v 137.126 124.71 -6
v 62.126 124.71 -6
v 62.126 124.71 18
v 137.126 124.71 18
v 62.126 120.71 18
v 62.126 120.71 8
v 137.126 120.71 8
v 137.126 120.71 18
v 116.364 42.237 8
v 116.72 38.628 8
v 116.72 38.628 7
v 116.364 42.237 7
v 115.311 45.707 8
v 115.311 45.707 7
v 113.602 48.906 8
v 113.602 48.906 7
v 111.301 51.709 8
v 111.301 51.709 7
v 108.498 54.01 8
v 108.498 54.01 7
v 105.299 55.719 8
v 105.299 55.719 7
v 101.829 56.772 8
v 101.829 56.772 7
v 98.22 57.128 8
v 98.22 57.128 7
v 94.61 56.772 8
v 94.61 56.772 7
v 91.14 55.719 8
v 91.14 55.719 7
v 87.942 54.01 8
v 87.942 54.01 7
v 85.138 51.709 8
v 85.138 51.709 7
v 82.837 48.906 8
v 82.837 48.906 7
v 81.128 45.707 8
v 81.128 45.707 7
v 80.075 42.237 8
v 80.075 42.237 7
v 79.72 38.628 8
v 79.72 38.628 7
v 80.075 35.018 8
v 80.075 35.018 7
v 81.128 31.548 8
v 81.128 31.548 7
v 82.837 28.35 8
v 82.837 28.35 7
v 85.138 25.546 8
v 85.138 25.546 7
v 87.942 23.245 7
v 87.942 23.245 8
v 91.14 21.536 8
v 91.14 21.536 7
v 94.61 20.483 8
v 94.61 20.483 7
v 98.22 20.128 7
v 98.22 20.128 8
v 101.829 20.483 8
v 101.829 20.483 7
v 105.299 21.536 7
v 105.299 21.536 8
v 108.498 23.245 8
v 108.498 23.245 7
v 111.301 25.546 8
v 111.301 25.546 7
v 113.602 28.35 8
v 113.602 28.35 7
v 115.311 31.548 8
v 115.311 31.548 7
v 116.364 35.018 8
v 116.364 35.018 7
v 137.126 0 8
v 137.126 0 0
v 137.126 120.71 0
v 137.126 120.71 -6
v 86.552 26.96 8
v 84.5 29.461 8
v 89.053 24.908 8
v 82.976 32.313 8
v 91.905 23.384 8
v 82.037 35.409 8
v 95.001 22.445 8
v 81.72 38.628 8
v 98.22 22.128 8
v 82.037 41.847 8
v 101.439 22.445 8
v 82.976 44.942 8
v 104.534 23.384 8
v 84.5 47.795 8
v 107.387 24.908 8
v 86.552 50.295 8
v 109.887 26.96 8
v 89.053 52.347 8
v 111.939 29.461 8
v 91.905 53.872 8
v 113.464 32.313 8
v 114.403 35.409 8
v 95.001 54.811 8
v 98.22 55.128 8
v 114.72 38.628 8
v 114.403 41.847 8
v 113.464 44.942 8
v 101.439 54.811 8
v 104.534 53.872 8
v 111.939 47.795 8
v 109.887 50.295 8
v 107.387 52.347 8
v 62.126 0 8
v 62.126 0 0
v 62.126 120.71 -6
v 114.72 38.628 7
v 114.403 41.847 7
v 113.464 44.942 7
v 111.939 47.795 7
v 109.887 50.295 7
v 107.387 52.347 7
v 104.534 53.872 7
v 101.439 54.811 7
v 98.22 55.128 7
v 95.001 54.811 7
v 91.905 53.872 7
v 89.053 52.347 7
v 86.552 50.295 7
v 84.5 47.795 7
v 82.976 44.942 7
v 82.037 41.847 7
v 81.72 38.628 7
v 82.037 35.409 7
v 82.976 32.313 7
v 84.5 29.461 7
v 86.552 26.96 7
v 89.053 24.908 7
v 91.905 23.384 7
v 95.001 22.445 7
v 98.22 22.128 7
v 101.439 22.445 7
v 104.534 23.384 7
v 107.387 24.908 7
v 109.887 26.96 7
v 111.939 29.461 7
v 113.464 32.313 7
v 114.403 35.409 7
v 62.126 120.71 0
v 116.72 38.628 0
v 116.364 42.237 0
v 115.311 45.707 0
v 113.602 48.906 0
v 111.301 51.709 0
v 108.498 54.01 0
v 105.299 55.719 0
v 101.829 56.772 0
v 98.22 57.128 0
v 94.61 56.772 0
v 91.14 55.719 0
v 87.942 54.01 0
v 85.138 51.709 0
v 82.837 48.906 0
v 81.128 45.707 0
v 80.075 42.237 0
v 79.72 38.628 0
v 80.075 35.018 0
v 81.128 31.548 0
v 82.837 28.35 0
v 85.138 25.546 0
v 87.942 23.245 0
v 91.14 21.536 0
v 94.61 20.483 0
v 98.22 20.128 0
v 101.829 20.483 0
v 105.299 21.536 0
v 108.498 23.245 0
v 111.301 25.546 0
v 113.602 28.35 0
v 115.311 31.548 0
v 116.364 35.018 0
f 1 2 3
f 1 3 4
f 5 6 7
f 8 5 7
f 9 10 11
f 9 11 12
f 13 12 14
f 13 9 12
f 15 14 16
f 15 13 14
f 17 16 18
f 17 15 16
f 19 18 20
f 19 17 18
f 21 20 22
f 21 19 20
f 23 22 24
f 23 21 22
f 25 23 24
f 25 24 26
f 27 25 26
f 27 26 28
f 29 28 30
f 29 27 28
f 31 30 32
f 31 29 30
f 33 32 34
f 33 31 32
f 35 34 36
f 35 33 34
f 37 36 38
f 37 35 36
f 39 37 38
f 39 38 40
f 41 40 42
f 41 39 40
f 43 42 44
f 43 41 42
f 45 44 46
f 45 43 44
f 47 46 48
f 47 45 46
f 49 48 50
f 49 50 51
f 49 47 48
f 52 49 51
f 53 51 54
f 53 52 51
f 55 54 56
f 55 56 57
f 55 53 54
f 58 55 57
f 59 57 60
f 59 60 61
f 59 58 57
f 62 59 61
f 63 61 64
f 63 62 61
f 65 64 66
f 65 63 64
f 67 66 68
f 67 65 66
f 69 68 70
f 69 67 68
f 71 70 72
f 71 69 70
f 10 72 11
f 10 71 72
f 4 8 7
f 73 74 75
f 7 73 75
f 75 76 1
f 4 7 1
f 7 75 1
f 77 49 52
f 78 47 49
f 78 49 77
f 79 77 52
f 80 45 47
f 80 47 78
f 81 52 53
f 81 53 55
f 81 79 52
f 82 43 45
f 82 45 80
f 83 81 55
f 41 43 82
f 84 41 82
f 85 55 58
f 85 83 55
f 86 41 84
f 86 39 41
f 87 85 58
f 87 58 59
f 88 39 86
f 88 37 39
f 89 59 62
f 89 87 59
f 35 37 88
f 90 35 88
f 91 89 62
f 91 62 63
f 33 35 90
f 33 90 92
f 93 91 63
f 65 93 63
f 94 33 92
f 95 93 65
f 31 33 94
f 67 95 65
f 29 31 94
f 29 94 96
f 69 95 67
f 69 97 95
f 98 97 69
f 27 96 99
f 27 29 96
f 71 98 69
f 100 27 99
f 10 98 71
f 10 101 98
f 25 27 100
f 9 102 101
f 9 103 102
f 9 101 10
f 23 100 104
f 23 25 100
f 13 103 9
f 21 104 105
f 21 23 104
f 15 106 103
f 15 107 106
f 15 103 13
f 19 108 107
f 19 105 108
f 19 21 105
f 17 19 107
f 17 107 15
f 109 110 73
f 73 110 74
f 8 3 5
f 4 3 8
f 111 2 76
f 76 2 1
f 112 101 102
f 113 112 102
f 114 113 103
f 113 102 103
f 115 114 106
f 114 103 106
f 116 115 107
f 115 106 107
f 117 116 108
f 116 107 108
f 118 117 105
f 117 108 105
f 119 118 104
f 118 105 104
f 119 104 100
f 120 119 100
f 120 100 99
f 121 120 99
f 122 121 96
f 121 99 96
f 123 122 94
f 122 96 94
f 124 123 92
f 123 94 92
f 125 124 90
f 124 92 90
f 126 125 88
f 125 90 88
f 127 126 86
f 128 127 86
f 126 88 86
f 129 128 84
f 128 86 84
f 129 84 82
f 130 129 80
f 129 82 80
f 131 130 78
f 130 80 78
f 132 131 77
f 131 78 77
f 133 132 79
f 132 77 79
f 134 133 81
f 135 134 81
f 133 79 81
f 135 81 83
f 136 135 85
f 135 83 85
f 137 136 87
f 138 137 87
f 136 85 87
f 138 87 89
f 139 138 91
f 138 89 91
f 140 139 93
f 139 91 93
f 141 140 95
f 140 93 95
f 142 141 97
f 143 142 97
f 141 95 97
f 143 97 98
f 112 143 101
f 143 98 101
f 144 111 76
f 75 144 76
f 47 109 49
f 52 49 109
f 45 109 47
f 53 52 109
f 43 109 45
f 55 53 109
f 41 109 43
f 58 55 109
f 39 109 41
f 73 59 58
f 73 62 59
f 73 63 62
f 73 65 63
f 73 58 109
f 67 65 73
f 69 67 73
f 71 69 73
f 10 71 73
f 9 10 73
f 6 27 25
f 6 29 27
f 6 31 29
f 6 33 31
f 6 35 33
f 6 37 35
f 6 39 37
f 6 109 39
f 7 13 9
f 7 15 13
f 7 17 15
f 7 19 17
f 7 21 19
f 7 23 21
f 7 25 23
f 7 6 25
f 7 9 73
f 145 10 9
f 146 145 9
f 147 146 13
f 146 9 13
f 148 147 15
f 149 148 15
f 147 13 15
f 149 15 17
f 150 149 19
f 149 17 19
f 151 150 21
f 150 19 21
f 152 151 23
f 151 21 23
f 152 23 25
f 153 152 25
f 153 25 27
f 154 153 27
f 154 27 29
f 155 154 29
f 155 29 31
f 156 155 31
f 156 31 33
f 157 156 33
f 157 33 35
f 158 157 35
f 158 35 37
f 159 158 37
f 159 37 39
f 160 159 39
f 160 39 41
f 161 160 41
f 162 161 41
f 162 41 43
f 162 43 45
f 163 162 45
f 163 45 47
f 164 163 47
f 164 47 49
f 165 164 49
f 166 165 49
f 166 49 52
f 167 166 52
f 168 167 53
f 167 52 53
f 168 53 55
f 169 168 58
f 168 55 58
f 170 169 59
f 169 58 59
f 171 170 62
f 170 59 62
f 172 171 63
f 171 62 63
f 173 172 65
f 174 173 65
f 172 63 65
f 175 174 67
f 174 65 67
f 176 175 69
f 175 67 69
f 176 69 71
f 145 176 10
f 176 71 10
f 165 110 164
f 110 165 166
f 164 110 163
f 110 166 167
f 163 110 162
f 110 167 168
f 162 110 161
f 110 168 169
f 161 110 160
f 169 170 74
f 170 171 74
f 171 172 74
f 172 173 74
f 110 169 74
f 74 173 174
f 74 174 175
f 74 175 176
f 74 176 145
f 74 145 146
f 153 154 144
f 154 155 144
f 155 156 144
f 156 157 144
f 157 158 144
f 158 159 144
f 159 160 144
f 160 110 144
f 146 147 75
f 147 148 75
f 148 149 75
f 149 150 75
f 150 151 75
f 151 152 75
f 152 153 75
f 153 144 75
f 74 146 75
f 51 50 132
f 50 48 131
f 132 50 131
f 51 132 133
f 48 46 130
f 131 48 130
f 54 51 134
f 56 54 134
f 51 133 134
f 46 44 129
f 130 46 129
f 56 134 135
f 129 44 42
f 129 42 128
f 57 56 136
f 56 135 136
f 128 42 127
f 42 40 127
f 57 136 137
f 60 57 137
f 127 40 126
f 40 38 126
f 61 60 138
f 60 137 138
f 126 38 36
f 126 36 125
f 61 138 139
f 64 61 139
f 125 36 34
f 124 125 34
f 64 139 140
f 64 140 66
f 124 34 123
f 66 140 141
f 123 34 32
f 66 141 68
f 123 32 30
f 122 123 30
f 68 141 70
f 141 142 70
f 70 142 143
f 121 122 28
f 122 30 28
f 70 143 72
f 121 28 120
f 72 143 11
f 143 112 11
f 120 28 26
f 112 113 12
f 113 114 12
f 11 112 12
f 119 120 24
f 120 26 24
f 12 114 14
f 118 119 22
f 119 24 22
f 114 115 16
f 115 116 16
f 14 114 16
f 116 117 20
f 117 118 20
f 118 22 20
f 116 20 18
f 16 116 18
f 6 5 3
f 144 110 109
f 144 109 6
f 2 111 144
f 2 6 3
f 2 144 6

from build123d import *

# Parameters (mm, degrees)
SKETCH12_W                = 75
SKETCH12_H                = 124.71
BOSS_EXTRUDE10_DEPTH      = 8
BOSS_EXTRUDE13_DEPTH      = 10
BOSS_EXTRUDE13_DEPTH_BACK = 14
SKETCH24_W                = 75
SKETCH24_H                = 4
SKETCH25_R                = 18.5
CUT_EXTRUDE1_DEPTH        = 186.881905155
SKETCH26_R                = 18.5
SKETCH26_R_2              = 16.5
BOSS_EXTRUDE15_DEPTH      = 1


with BuildPart() as part:
    # Sketch12 → Boss-Extrude10 (new body)
    with BuildSketch(Plane.XY):
        with Locations((99.625849364, 62.355)):
            Rectangle(SKETCH12_W, SKETCH12_H)
    extrude(amount=BOSS_EXTRUDE10_DEPTH)

    # Sketch24 → Boss-Extrude13 (add, two sides: drawn at the far end of the back side and taken through both)
    with BuildSketch(Plane.XY.offset(8).offset(-BOSS_EXTRUDE13_DEPTH_BACK)):
        with Locations((99.625849364, 122.71)):
            Rectangle(SKETCH24_W, SKETCH24_H)
    extrude(amount=BOSS_EXTRUDE13_DEPTH + BOSS_EXTRUDE13_DEPTH_BACK)

    # Sketch25 → Cut-Extrude1 (cut, through all)
    with BuildSketch(Plane.XY.offset(8)):
        with Locations((98.219620603, 38.627603634)):
            Circle(SKETCH25_R)
    extrude(amount=-CUT_EXTRUDE1_DEPTH, mode=Mode.SUBTRACT)


with BuildPart() as body_2:
    # Sketch26 → Boss-Extrude15 (new body)
    with BuildSketch(Plane.XY.offset(8)):
        with Locations((98.219620603, 38.627603634)):
            Circle(SKETCH26_R)
        with Locations((98.219620603, 38.627603634)):
            Circle(SKETCH26_R_2, mode=Mode.SUBTRACT)
    extrude(amount=-BOSS_EXTRUDE15_DEPTH)


solid = Compound([part.part, body_2.part])
